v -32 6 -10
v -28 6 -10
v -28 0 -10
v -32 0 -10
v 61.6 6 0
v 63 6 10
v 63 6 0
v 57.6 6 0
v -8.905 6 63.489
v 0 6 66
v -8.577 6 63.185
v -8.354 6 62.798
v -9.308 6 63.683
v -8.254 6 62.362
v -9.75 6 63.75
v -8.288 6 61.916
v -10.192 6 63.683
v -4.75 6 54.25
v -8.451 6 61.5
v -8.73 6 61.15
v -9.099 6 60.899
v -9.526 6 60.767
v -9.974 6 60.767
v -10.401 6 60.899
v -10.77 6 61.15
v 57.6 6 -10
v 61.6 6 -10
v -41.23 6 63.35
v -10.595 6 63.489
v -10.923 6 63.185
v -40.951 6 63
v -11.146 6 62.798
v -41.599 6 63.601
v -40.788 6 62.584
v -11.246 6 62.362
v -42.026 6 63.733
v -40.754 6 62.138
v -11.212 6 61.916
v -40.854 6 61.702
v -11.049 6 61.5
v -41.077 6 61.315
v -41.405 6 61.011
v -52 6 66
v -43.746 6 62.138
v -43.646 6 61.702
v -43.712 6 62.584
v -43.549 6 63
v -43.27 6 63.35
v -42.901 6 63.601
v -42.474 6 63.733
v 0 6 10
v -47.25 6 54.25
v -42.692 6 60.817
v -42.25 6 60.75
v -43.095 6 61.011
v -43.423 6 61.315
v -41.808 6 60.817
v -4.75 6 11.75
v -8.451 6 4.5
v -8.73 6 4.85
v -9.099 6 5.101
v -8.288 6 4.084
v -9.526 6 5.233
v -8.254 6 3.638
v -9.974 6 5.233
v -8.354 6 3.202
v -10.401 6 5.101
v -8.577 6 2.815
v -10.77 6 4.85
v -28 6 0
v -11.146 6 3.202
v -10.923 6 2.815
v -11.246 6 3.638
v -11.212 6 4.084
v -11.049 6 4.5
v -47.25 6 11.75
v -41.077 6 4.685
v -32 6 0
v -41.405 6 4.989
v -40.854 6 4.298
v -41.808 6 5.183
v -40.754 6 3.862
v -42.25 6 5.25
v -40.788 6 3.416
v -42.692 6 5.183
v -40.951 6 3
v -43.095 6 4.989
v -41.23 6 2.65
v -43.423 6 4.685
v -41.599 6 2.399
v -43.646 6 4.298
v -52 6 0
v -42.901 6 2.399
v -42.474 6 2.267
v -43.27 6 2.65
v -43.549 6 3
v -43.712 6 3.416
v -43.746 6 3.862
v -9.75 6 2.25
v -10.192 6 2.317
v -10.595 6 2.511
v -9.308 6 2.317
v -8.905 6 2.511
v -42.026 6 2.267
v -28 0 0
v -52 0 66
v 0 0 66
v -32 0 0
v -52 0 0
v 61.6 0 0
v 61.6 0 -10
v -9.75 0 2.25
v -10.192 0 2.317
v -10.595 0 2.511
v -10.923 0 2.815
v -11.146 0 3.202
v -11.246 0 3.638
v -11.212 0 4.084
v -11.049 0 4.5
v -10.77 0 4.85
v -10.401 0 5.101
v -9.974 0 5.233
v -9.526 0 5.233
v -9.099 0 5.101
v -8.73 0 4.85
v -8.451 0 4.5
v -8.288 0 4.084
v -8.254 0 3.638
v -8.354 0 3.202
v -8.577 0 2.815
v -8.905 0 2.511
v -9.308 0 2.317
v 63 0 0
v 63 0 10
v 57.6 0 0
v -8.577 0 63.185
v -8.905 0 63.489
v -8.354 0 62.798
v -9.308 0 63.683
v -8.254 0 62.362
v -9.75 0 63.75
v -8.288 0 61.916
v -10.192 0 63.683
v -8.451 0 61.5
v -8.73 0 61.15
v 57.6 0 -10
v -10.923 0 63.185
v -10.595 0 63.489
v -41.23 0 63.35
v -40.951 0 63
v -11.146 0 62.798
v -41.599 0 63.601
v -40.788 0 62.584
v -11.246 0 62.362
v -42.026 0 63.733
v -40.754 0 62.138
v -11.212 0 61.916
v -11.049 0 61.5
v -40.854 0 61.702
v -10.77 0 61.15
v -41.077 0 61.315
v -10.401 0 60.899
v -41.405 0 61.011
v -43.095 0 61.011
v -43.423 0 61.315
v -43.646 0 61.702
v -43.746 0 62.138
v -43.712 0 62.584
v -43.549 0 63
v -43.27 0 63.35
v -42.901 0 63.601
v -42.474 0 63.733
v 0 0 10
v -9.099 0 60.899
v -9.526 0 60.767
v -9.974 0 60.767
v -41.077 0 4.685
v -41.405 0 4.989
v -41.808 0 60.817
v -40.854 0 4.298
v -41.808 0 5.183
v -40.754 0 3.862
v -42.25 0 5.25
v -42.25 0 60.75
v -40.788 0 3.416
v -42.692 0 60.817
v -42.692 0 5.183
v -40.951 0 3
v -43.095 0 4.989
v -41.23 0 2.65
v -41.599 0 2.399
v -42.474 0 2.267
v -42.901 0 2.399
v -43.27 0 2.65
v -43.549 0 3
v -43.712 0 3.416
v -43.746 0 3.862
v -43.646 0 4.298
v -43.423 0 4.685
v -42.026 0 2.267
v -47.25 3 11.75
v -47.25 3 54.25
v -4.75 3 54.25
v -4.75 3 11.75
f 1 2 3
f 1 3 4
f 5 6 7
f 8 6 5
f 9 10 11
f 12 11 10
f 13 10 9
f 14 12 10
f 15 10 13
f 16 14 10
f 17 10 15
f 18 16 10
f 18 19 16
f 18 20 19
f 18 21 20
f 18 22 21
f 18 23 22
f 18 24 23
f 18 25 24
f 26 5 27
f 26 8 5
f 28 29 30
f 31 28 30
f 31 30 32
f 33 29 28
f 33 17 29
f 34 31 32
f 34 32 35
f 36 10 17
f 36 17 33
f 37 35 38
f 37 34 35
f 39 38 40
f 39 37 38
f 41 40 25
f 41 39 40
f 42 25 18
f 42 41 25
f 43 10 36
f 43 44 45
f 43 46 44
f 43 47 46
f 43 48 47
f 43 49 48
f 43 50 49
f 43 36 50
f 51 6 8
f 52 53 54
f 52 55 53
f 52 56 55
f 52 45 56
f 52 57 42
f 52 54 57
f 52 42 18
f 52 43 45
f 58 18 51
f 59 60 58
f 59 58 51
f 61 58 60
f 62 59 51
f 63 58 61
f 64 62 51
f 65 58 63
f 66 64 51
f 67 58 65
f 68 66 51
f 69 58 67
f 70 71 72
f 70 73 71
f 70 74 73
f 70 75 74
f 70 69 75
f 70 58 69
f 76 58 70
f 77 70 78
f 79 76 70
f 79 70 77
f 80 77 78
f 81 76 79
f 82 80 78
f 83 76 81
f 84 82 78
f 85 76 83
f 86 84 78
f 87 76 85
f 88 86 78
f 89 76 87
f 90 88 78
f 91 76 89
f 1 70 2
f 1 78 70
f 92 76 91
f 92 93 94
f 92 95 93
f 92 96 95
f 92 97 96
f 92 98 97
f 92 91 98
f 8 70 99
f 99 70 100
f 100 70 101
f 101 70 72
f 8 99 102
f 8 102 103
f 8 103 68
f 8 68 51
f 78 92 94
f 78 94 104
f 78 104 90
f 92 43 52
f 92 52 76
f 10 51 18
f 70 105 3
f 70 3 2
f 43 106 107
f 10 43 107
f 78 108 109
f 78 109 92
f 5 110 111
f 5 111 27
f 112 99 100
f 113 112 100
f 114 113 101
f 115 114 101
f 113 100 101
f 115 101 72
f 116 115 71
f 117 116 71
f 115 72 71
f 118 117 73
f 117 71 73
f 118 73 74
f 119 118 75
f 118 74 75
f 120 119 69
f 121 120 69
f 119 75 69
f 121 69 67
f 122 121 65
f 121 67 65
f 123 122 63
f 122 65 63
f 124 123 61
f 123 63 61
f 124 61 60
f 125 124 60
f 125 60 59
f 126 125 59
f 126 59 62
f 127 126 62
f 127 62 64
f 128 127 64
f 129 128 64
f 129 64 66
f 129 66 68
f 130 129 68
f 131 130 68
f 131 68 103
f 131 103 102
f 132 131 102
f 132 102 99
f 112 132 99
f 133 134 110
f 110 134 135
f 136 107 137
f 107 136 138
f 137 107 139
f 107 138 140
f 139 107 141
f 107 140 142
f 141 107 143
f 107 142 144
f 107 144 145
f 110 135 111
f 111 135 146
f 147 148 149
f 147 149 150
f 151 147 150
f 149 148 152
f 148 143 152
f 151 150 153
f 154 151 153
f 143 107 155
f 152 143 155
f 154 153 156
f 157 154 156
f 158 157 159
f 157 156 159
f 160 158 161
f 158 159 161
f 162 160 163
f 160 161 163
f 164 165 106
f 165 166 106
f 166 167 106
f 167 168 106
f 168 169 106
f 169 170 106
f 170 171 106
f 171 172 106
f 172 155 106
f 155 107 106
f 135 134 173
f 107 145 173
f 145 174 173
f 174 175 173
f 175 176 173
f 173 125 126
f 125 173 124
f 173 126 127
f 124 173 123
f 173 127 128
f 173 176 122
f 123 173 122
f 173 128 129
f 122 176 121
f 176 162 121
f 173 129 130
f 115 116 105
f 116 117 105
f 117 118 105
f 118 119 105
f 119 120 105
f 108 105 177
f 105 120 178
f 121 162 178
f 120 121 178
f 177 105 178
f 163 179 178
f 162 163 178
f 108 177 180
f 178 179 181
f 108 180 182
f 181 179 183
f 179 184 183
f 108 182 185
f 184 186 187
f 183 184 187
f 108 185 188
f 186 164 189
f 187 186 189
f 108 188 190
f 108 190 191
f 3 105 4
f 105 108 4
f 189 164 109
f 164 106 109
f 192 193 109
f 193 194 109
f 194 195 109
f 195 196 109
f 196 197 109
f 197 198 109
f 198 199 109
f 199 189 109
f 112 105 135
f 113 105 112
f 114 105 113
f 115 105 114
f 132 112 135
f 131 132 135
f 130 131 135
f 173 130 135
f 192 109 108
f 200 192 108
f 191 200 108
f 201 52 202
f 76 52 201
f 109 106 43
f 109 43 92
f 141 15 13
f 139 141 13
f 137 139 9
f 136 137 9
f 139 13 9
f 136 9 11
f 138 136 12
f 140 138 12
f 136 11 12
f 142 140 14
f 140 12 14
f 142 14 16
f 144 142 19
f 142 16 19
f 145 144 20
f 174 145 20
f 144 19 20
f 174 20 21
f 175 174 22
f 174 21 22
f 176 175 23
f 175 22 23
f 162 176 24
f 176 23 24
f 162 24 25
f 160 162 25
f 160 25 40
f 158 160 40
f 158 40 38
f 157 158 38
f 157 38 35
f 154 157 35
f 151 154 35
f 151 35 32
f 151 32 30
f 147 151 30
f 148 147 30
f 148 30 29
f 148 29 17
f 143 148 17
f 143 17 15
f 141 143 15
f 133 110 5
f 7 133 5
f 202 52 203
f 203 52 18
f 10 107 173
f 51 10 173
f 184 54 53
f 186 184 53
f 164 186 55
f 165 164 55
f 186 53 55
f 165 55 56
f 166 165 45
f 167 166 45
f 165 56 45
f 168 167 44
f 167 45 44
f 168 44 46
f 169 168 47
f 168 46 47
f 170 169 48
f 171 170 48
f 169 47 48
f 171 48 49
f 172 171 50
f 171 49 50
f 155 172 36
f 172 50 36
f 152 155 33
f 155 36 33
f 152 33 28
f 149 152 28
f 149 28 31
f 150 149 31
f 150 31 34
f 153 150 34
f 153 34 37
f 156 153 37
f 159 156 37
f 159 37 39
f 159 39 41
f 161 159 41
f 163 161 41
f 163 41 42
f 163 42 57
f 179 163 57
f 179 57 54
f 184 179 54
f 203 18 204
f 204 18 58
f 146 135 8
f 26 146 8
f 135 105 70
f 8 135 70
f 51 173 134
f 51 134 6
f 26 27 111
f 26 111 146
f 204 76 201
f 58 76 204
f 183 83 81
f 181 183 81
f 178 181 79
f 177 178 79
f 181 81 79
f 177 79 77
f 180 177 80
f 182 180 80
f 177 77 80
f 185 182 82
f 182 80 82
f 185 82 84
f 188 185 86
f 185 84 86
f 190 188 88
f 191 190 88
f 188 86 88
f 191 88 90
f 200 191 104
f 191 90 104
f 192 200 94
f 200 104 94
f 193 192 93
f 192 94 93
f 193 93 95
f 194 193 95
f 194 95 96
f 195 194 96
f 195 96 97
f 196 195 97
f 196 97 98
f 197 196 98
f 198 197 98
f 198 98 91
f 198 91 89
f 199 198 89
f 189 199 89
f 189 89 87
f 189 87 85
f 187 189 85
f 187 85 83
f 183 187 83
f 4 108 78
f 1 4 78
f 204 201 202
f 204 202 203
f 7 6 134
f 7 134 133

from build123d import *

# Parameters (mm, degrees)
SKETCH1_W           = 52
SKETCH1_H           = 66
BOSS_EXTRUDE1_DEPTH = 6
SKETCH2_W           = 42.5
SKETCH2_H           = 42.5
CUT_EXTRUDE1_DEPTH  = 3
SKETCH3_R           = 1.5
CUT_EXTRUDE2_DEPTH  = 13
SKETCH4_W           = 10
SKETCH4_H           = 6
BOSS_EXTRUDE2_DEPTH = 63
SKETCH5_W           = 4
SKETCH5_H           = 6
BOSS_EXTRUDE3_DEPTH = 10


with BuildPart() as part:
    # Sketch1 → Boss-Extrude1 (new body)
    with BuildSketch(Plane(origin=(0, 0, 0), x_dir=(1, 0, 0), z_dir=(0, 1, 0))):
        with Locations((-26, -33)):
            Rectangle(SKETCH1_W, SKETCH1_H)
    extrude(amount=BOSS_EXTRUDE1_DEPTH)

    # Sketch2 → Cut-Extrude1 (cut)
    with BuildSketch(Plane(origin=(0, 6, 0), x_dir=(1, 0, 0), z_dir=(0, 1, 0))):
        with Locations((-26, -33)):
            Rectangle(SKETCH2_W, SKETCH2_H)
    extrude(amount=-CUT_EXTRUDE1_DEPTH, mode=Mode.SUBTRACT)

    # Sketch3 → Cut-Extrude2 (cut)
    with BuildSketch(Plane(origin=(0, 6, 0), x_dir=(1, 0, 0), z_dir=(0, 1, 0))):
        with Locations(Location((-42.25, -3.75, 0), (0, 0, 270))):
            Circle(SKETCH3_R)
        with Locations(Location((-9.75, -3.75, 0), (0, 0, 90))):
            Circle(SKETCH3_R)
        with Locations(Location((-9.75, -62.25, 0), (0, 0, 270))):
            Circle(SKETCH3_R)
        with Locations(Location((-42.25, -62.25, 0), (0, 0, 90))):
            Circle(SKETCH3_R)
    extrude(amount=-CUT_EXTRUDE2_DEPTH, mode=Mode.SUBTRACT)

    # Sketch4 → Boss-Extrude2 (add)
    with BuildSketch(Plane(origin=(0, 0, 0), x_dir=(0, 0, -1), z_dir=(1, 0, 0))):
        with Locations((-5, 3)):
            Rectangle(SKETCH4_W, SKETCH4_H)
    extrude(amount=BOSS_EXTRUDE2_DEPTH)

    # Sketch5 → Boss-Extrude3 (add)
    with BuildSketch(Plane(origin=(0, 0, 0), x_dir=(-1, 0, 0), z_dir=(0, 0, -1))):
        with Locations((30, 3)):
            Rectangle(SKETCH5_W, SKETCH5_H)
        with Locations((-59.6, 3)):
            Rectangle(SKETCH5_W, SKETCH5_H)
    extrude(amount=BOSS_EXTRUDE3_DEPTH)


solid = part.part
